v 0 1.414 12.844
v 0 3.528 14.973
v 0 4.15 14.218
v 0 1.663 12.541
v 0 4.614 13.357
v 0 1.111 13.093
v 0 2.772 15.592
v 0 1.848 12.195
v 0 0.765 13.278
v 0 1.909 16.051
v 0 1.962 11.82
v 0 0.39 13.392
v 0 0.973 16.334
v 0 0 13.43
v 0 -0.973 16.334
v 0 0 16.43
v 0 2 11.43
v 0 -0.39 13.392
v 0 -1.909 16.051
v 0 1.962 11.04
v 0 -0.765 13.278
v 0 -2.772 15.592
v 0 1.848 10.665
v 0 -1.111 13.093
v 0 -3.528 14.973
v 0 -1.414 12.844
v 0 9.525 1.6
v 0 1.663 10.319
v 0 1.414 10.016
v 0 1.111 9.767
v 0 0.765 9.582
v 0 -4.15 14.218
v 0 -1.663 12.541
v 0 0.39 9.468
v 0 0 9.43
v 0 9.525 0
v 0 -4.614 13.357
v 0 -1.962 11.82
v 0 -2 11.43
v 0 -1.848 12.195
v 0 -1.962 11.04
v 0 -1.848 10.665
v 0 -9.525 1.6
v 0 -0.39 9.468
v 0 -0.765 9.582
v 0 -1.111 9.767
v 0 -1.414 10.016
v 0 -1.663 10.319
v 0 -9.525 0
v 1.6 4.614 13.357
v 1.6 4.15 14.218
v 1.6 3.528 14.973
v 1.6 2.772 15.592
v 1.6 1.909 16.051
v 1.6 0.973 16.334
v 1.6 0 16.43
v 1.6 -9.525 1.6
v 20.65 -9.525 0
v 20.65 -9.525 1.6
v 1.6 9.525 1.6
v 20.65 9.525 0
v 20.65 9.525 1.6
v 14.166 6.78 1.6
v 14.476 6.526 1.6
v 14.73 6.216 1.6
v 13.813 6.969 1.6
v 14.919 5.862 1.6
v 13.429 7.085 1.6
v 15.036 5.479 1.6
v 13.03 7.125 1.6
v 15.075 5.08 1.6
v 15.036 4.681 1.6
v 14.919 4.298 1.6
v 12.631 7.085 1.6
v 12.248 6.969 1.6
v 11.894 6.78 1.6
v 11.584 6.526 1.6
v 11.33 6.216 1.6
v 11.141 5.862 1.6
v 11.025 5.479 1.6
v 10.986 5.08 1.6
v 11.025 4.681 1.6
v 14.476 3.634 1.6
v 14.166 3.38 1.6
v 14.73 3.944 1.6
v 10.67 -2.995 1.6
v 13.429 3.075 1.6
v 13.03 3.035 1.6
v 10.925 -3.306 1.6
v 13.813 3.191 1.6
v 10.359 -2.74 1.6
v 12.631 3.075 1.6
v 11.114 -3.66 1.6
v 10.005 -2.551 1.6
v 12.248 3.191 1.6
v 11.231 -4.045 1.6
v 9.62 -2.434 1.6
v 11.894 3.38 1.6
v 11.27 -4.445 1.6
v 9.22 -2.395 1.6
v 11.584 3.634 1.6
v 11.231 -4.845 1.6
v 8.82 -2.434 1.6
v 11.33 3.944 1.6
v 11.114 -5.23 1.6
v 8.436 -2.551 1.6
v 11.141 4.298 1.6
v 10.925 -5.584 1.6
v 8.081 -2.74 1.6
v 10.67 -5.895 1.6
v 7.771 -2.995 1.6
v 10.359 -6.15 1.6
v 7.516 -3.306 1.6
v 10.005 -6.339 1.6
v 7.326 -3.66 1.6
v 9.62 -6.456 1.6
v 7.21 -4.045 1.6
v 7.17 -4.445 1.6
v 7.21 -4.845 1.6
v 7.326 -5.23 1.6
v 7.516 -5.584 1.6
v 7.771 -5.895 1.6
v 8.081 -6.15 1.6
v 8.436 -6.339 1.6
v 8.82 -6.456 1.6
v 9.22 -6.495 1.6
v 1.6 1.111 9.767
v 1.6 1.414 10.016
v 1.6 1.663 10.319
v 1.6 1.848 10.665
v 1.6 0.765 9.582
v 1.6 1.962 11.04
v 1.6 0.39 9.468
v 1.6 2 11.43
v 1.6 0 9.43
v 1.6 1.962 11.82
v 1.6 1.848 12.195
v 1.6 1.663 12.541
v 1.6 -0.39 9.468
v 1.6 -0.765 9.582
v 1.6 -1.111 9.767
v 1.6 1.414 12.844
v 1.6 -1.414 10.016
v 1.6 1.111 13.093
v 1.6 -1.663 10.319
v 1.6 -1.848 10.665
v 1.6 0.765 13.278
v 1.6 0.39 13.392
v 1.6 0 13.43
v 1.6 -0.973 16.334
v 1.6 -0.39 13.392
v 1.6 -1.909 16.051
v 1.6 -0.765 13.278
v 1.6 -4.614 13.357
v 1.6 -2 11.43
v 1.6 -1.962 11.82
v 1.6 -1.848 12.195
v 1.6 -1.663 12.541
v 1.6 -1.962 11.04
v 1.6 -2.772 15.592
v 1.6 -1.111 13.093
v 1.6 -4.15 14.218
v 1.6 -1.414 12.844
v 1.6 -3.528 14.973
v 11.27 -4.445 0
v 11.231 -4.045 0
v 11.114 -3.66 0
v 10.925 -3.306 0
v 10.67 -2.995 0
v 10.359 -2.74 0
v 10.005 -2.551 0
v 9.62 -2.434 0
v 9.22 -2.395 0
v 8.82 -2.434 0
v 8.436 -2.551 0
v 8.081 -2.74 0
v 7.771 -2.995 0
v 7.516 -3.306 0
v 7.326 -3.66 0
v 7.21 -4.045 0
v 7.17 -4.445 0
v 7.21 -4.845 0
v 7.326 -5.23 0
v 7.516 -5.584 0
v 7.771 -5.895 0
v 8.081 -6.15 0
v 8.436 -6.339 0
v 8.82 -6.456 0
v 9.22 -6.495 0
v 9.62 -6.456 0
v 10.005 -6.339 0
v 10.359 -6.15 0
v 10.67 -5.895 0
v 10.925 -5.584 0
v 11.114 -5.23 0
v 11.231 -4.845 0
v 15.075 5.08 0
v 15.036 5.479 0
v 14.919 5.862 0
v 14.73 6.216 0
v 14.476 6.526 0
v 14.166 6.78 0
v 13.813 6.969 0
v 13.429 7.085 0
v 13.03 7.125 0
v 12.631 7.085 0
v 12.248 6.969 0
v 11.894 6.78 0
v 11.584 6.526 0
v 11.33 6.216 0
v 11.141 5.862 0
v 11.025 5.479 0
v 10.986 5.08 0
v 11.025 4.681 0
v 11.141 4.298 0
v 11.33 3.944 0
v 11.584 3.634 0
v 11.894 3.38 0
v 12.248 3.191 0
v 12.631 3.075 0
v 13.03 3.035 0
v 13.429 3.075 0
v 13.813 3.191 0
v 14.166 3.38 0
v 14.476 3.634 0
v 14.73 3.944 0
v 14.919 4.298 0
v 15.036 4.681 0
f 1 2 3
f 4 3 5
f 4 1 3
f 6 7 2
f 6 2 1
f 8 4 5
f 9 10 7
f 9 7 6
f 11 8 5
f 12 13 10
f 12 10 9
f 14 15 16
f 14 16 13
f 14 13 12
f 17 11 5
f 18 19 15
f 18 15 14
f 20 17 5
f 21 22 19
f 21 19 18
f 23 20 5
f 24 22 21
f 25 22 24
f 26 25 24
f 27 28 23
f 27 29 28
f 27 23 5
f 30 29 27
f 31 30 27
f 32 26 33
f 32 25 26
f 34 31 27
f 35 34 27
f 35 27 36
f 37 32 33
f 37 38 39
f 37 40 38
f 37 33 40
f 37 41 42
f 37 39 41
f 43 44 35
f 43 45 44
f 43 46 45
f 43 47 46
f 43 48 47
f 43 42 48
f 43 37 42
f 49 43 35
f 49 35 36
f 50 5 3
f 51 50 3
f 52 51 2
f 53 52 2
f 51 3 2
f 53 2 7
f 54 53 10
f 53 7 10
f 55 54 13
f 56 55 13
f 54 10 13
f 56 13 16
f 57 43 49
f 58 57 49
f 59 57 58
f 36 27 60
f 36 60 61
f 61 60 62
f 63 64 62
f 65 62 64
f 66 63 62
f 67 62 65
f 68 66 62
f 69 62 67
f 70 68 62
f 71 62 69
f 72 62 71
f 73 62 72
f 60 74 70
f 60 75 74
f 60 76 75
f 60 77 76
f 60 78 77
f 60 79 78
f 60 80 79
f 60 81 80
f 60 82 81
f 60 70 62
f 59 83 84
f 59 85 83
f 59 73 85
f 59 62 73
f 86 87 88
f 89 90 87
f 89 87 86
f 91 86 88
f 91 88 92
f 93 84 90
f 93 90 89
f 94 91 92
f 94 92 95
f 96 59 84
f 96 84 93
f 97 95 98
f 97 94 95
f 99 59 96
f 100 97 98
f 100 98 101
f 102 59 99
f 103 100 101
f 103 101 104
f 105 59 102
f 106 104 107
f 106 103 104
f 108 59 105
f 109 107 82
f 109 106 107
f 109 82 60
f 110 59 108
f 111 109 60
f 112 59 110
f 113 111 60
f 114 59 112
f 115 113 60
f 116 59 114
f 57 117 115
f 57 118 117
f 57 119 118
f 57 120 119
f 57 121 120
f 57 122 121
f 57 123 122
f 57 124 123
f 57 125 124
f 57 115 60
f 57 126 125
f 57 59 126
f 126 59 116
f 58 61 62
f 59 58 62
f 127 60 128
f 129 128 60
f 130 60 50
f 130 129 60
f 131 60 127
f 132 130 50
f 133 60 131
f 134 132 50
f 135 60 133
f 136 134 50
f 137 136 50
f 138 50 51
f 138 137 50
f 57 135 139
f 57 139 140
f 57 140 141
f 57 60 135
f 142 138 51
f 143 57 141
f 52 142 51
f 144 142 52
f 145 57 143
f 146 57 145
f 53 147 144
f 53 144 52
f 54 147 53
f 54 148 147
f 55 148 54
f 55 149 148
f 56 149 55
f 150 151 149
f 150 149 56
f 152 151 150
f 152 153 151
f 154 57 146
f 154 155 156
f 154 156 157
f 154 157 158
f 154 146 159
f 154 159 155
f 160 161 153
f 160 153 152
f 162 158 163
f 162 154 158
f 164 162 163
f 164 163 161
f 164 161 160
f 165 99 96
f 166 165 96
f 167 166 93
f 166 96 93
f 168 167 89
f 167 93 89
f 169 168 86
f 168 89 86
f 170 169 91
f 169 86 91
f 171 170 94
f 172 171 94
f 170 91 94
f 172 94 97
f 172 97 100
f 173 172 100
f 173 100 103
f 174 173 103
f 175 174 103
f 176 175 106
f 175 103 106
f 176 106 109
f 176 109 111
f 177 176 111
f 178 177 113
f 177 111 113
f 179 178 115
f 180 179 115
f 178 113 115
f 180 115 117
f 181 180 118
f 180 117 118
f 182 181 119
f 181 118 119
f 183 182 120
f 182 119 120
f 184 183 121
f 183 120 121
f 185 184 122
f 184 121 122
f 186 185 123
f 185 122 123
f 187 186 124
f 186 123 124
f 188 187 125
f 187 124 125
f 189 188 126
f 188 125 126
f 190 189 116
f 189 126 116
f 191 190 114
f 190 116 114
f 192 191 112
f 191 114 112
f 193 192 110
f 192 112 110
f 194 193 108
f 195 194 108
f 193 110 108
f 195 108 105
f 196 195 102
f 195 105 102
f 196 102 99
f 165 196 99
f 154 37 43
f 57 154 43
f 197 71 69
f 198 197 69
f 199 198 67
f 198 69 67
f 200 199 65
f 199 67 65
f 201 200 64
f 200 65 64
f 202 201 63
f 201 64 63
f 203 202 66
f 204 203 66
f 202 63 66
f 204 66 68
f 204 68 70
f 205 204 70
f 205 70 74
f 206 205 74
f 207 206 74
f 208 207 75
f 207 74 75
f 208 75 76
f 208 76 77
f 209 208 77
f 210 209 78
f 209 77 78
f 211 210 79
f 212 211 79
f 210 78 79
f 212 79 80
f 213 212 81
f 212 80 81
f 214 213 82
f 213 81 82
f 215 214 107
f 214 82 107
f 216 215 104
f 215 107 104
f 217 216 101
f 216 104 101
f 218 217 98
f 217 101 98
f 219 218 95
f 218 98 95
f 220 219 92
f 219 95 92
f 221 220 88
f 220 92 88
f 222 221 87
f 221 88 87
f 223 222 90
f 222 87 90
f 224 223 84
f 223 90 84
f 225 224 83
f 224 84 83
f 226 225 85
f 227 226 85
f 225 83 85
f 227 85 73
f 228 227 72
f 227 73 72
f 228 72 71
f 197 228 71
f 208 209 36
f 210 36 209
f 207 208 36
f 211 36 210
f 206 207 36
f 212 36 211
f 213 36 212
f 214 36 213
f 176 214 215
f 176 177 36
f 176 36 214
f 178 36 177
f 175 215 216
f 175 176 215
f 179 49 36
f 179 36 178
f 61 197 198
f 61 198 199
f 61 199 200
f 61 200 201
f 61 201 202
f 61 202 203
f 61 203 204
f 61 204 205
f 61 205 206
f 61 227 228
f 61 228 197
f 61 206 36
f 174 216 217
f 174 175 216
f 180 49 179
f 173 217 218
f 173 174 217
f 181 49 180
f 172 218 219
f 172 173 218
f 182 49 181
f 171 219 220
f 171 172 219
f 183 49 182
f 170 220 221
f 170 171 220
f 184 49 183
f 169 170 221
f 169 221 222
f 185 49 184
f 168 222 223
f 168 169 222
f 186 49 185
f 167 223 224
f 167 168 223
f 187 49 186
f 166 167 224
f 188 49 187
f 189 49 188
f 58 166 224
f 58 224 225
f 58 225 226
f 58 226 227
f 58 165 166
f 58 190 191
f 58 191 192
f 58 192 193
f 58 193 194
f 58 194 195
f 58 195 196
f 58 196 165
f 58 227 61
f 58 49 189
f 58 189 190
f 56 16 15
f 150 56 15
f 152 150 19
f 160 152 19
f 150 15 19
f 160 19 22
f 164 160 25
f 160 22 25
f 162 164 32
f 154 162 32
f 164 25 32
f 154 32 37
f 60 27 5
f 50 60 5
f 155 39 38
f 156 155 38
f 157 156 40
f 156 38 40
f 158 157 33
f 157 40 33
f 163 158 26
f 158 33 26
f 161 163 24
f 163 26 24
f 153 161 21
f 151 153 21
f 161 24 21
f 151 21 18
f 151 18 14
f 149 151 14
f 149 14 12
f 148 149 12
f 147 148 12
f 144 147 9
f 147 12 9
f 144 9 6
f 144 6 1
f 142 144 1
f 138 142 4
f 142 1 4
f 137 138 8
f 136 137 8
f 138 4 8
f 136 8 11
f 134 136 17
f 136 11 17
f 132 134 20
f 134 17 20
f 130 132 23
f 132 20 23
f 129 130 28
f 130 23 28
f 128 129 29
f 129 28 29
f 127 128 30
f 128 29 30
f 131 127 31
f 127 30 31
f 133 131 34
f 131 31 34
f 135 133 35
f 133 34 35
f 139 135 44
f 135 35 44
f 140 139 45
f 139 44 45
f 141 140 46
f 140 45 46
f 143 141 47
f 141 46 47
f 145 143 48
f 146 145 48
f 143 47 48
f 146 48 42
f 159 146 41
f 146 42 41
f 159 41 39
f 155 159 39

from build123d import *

# Parameters (mm, degrees)
F1_DEPTH = 9.525
F2_R     = 2
F3_DEPTH = 1.6002
F5_DEPTH = 1.6002
F6_R     = 2.0447
F6_R_2   = 2.05
F7_DEPTH = 1.6002


# Not quite as in the source:
# - a feature names something its author has since deleted; it is built from what else it names


with BuildPart() as f1:
    # F0 (on Front) → F1 (new body, symmetric)
    with BuildSketch(Plane.XZ):
        Polygon((1.6002, 19.05), (0, 19.05), (0, 0), (20.6502, 0), (20.6502, 1.6002), (1.6002, 1.6002), align=None)
    extrude(amount=F1_DEPTH, both=True)

    # F2 (on face) → F3 (cut, through all)
    with BuildSketch(Plane(origin=(0, 0, 0), x_dir=(0, -1, 0), z_dir=(-1, 0, 0))):
        with Locations((0, 11.43)):
            Circle(F2_R)
    extrude(amount=-F3_DEPTH, mode=Mode.SUBTRACT)

    # F4 (on face) → F5 (cut, through all)
    with BuildSketch(Plane(origin=(0, 0, 0), x_dir=(0, -1, 0), z_dir=(-1, 0, 0))):
        with BuildLine():
            Line((-9.525, 19.05), (-9.525, 1.6002))
            Line((-9.525, 1.6002), (-4.6136292969, 13.3572842838))
            ThreePointArc((-4.6136292969, 13.3572842838), (-2.7716041006, 15.5915154343), (0, 16.43))
            ThreePointArc((0, 16.43), (2.7716041006, 15.5915154343), (4.6136292969, 13.3572842838))
            Line((4.6136292969, 13.3572842838), (9.525, 1.6002))
            Line((9.525, 1.6002), (9.525, 19.05))
            Line((9.525, 19.05), (-9.525, 19.05))
        make_face()
    extrude(amount=-F5_DEPTH, mode=Mode.SUBTRACT)

    # F6 (on face) → F7 (cut, through all)
    with BuildSketch(Plane.XY.offset(1.6002)):
        with Locations((13.0302, 5.08)):
            Circle(F6_R)
        with Locations((9.2202, -4.445)):
            Circle(F6_R_2)
    extrude(amount=-F7_DEPTH, mode=Mode.SUBTRACT)


solid = f1.part
